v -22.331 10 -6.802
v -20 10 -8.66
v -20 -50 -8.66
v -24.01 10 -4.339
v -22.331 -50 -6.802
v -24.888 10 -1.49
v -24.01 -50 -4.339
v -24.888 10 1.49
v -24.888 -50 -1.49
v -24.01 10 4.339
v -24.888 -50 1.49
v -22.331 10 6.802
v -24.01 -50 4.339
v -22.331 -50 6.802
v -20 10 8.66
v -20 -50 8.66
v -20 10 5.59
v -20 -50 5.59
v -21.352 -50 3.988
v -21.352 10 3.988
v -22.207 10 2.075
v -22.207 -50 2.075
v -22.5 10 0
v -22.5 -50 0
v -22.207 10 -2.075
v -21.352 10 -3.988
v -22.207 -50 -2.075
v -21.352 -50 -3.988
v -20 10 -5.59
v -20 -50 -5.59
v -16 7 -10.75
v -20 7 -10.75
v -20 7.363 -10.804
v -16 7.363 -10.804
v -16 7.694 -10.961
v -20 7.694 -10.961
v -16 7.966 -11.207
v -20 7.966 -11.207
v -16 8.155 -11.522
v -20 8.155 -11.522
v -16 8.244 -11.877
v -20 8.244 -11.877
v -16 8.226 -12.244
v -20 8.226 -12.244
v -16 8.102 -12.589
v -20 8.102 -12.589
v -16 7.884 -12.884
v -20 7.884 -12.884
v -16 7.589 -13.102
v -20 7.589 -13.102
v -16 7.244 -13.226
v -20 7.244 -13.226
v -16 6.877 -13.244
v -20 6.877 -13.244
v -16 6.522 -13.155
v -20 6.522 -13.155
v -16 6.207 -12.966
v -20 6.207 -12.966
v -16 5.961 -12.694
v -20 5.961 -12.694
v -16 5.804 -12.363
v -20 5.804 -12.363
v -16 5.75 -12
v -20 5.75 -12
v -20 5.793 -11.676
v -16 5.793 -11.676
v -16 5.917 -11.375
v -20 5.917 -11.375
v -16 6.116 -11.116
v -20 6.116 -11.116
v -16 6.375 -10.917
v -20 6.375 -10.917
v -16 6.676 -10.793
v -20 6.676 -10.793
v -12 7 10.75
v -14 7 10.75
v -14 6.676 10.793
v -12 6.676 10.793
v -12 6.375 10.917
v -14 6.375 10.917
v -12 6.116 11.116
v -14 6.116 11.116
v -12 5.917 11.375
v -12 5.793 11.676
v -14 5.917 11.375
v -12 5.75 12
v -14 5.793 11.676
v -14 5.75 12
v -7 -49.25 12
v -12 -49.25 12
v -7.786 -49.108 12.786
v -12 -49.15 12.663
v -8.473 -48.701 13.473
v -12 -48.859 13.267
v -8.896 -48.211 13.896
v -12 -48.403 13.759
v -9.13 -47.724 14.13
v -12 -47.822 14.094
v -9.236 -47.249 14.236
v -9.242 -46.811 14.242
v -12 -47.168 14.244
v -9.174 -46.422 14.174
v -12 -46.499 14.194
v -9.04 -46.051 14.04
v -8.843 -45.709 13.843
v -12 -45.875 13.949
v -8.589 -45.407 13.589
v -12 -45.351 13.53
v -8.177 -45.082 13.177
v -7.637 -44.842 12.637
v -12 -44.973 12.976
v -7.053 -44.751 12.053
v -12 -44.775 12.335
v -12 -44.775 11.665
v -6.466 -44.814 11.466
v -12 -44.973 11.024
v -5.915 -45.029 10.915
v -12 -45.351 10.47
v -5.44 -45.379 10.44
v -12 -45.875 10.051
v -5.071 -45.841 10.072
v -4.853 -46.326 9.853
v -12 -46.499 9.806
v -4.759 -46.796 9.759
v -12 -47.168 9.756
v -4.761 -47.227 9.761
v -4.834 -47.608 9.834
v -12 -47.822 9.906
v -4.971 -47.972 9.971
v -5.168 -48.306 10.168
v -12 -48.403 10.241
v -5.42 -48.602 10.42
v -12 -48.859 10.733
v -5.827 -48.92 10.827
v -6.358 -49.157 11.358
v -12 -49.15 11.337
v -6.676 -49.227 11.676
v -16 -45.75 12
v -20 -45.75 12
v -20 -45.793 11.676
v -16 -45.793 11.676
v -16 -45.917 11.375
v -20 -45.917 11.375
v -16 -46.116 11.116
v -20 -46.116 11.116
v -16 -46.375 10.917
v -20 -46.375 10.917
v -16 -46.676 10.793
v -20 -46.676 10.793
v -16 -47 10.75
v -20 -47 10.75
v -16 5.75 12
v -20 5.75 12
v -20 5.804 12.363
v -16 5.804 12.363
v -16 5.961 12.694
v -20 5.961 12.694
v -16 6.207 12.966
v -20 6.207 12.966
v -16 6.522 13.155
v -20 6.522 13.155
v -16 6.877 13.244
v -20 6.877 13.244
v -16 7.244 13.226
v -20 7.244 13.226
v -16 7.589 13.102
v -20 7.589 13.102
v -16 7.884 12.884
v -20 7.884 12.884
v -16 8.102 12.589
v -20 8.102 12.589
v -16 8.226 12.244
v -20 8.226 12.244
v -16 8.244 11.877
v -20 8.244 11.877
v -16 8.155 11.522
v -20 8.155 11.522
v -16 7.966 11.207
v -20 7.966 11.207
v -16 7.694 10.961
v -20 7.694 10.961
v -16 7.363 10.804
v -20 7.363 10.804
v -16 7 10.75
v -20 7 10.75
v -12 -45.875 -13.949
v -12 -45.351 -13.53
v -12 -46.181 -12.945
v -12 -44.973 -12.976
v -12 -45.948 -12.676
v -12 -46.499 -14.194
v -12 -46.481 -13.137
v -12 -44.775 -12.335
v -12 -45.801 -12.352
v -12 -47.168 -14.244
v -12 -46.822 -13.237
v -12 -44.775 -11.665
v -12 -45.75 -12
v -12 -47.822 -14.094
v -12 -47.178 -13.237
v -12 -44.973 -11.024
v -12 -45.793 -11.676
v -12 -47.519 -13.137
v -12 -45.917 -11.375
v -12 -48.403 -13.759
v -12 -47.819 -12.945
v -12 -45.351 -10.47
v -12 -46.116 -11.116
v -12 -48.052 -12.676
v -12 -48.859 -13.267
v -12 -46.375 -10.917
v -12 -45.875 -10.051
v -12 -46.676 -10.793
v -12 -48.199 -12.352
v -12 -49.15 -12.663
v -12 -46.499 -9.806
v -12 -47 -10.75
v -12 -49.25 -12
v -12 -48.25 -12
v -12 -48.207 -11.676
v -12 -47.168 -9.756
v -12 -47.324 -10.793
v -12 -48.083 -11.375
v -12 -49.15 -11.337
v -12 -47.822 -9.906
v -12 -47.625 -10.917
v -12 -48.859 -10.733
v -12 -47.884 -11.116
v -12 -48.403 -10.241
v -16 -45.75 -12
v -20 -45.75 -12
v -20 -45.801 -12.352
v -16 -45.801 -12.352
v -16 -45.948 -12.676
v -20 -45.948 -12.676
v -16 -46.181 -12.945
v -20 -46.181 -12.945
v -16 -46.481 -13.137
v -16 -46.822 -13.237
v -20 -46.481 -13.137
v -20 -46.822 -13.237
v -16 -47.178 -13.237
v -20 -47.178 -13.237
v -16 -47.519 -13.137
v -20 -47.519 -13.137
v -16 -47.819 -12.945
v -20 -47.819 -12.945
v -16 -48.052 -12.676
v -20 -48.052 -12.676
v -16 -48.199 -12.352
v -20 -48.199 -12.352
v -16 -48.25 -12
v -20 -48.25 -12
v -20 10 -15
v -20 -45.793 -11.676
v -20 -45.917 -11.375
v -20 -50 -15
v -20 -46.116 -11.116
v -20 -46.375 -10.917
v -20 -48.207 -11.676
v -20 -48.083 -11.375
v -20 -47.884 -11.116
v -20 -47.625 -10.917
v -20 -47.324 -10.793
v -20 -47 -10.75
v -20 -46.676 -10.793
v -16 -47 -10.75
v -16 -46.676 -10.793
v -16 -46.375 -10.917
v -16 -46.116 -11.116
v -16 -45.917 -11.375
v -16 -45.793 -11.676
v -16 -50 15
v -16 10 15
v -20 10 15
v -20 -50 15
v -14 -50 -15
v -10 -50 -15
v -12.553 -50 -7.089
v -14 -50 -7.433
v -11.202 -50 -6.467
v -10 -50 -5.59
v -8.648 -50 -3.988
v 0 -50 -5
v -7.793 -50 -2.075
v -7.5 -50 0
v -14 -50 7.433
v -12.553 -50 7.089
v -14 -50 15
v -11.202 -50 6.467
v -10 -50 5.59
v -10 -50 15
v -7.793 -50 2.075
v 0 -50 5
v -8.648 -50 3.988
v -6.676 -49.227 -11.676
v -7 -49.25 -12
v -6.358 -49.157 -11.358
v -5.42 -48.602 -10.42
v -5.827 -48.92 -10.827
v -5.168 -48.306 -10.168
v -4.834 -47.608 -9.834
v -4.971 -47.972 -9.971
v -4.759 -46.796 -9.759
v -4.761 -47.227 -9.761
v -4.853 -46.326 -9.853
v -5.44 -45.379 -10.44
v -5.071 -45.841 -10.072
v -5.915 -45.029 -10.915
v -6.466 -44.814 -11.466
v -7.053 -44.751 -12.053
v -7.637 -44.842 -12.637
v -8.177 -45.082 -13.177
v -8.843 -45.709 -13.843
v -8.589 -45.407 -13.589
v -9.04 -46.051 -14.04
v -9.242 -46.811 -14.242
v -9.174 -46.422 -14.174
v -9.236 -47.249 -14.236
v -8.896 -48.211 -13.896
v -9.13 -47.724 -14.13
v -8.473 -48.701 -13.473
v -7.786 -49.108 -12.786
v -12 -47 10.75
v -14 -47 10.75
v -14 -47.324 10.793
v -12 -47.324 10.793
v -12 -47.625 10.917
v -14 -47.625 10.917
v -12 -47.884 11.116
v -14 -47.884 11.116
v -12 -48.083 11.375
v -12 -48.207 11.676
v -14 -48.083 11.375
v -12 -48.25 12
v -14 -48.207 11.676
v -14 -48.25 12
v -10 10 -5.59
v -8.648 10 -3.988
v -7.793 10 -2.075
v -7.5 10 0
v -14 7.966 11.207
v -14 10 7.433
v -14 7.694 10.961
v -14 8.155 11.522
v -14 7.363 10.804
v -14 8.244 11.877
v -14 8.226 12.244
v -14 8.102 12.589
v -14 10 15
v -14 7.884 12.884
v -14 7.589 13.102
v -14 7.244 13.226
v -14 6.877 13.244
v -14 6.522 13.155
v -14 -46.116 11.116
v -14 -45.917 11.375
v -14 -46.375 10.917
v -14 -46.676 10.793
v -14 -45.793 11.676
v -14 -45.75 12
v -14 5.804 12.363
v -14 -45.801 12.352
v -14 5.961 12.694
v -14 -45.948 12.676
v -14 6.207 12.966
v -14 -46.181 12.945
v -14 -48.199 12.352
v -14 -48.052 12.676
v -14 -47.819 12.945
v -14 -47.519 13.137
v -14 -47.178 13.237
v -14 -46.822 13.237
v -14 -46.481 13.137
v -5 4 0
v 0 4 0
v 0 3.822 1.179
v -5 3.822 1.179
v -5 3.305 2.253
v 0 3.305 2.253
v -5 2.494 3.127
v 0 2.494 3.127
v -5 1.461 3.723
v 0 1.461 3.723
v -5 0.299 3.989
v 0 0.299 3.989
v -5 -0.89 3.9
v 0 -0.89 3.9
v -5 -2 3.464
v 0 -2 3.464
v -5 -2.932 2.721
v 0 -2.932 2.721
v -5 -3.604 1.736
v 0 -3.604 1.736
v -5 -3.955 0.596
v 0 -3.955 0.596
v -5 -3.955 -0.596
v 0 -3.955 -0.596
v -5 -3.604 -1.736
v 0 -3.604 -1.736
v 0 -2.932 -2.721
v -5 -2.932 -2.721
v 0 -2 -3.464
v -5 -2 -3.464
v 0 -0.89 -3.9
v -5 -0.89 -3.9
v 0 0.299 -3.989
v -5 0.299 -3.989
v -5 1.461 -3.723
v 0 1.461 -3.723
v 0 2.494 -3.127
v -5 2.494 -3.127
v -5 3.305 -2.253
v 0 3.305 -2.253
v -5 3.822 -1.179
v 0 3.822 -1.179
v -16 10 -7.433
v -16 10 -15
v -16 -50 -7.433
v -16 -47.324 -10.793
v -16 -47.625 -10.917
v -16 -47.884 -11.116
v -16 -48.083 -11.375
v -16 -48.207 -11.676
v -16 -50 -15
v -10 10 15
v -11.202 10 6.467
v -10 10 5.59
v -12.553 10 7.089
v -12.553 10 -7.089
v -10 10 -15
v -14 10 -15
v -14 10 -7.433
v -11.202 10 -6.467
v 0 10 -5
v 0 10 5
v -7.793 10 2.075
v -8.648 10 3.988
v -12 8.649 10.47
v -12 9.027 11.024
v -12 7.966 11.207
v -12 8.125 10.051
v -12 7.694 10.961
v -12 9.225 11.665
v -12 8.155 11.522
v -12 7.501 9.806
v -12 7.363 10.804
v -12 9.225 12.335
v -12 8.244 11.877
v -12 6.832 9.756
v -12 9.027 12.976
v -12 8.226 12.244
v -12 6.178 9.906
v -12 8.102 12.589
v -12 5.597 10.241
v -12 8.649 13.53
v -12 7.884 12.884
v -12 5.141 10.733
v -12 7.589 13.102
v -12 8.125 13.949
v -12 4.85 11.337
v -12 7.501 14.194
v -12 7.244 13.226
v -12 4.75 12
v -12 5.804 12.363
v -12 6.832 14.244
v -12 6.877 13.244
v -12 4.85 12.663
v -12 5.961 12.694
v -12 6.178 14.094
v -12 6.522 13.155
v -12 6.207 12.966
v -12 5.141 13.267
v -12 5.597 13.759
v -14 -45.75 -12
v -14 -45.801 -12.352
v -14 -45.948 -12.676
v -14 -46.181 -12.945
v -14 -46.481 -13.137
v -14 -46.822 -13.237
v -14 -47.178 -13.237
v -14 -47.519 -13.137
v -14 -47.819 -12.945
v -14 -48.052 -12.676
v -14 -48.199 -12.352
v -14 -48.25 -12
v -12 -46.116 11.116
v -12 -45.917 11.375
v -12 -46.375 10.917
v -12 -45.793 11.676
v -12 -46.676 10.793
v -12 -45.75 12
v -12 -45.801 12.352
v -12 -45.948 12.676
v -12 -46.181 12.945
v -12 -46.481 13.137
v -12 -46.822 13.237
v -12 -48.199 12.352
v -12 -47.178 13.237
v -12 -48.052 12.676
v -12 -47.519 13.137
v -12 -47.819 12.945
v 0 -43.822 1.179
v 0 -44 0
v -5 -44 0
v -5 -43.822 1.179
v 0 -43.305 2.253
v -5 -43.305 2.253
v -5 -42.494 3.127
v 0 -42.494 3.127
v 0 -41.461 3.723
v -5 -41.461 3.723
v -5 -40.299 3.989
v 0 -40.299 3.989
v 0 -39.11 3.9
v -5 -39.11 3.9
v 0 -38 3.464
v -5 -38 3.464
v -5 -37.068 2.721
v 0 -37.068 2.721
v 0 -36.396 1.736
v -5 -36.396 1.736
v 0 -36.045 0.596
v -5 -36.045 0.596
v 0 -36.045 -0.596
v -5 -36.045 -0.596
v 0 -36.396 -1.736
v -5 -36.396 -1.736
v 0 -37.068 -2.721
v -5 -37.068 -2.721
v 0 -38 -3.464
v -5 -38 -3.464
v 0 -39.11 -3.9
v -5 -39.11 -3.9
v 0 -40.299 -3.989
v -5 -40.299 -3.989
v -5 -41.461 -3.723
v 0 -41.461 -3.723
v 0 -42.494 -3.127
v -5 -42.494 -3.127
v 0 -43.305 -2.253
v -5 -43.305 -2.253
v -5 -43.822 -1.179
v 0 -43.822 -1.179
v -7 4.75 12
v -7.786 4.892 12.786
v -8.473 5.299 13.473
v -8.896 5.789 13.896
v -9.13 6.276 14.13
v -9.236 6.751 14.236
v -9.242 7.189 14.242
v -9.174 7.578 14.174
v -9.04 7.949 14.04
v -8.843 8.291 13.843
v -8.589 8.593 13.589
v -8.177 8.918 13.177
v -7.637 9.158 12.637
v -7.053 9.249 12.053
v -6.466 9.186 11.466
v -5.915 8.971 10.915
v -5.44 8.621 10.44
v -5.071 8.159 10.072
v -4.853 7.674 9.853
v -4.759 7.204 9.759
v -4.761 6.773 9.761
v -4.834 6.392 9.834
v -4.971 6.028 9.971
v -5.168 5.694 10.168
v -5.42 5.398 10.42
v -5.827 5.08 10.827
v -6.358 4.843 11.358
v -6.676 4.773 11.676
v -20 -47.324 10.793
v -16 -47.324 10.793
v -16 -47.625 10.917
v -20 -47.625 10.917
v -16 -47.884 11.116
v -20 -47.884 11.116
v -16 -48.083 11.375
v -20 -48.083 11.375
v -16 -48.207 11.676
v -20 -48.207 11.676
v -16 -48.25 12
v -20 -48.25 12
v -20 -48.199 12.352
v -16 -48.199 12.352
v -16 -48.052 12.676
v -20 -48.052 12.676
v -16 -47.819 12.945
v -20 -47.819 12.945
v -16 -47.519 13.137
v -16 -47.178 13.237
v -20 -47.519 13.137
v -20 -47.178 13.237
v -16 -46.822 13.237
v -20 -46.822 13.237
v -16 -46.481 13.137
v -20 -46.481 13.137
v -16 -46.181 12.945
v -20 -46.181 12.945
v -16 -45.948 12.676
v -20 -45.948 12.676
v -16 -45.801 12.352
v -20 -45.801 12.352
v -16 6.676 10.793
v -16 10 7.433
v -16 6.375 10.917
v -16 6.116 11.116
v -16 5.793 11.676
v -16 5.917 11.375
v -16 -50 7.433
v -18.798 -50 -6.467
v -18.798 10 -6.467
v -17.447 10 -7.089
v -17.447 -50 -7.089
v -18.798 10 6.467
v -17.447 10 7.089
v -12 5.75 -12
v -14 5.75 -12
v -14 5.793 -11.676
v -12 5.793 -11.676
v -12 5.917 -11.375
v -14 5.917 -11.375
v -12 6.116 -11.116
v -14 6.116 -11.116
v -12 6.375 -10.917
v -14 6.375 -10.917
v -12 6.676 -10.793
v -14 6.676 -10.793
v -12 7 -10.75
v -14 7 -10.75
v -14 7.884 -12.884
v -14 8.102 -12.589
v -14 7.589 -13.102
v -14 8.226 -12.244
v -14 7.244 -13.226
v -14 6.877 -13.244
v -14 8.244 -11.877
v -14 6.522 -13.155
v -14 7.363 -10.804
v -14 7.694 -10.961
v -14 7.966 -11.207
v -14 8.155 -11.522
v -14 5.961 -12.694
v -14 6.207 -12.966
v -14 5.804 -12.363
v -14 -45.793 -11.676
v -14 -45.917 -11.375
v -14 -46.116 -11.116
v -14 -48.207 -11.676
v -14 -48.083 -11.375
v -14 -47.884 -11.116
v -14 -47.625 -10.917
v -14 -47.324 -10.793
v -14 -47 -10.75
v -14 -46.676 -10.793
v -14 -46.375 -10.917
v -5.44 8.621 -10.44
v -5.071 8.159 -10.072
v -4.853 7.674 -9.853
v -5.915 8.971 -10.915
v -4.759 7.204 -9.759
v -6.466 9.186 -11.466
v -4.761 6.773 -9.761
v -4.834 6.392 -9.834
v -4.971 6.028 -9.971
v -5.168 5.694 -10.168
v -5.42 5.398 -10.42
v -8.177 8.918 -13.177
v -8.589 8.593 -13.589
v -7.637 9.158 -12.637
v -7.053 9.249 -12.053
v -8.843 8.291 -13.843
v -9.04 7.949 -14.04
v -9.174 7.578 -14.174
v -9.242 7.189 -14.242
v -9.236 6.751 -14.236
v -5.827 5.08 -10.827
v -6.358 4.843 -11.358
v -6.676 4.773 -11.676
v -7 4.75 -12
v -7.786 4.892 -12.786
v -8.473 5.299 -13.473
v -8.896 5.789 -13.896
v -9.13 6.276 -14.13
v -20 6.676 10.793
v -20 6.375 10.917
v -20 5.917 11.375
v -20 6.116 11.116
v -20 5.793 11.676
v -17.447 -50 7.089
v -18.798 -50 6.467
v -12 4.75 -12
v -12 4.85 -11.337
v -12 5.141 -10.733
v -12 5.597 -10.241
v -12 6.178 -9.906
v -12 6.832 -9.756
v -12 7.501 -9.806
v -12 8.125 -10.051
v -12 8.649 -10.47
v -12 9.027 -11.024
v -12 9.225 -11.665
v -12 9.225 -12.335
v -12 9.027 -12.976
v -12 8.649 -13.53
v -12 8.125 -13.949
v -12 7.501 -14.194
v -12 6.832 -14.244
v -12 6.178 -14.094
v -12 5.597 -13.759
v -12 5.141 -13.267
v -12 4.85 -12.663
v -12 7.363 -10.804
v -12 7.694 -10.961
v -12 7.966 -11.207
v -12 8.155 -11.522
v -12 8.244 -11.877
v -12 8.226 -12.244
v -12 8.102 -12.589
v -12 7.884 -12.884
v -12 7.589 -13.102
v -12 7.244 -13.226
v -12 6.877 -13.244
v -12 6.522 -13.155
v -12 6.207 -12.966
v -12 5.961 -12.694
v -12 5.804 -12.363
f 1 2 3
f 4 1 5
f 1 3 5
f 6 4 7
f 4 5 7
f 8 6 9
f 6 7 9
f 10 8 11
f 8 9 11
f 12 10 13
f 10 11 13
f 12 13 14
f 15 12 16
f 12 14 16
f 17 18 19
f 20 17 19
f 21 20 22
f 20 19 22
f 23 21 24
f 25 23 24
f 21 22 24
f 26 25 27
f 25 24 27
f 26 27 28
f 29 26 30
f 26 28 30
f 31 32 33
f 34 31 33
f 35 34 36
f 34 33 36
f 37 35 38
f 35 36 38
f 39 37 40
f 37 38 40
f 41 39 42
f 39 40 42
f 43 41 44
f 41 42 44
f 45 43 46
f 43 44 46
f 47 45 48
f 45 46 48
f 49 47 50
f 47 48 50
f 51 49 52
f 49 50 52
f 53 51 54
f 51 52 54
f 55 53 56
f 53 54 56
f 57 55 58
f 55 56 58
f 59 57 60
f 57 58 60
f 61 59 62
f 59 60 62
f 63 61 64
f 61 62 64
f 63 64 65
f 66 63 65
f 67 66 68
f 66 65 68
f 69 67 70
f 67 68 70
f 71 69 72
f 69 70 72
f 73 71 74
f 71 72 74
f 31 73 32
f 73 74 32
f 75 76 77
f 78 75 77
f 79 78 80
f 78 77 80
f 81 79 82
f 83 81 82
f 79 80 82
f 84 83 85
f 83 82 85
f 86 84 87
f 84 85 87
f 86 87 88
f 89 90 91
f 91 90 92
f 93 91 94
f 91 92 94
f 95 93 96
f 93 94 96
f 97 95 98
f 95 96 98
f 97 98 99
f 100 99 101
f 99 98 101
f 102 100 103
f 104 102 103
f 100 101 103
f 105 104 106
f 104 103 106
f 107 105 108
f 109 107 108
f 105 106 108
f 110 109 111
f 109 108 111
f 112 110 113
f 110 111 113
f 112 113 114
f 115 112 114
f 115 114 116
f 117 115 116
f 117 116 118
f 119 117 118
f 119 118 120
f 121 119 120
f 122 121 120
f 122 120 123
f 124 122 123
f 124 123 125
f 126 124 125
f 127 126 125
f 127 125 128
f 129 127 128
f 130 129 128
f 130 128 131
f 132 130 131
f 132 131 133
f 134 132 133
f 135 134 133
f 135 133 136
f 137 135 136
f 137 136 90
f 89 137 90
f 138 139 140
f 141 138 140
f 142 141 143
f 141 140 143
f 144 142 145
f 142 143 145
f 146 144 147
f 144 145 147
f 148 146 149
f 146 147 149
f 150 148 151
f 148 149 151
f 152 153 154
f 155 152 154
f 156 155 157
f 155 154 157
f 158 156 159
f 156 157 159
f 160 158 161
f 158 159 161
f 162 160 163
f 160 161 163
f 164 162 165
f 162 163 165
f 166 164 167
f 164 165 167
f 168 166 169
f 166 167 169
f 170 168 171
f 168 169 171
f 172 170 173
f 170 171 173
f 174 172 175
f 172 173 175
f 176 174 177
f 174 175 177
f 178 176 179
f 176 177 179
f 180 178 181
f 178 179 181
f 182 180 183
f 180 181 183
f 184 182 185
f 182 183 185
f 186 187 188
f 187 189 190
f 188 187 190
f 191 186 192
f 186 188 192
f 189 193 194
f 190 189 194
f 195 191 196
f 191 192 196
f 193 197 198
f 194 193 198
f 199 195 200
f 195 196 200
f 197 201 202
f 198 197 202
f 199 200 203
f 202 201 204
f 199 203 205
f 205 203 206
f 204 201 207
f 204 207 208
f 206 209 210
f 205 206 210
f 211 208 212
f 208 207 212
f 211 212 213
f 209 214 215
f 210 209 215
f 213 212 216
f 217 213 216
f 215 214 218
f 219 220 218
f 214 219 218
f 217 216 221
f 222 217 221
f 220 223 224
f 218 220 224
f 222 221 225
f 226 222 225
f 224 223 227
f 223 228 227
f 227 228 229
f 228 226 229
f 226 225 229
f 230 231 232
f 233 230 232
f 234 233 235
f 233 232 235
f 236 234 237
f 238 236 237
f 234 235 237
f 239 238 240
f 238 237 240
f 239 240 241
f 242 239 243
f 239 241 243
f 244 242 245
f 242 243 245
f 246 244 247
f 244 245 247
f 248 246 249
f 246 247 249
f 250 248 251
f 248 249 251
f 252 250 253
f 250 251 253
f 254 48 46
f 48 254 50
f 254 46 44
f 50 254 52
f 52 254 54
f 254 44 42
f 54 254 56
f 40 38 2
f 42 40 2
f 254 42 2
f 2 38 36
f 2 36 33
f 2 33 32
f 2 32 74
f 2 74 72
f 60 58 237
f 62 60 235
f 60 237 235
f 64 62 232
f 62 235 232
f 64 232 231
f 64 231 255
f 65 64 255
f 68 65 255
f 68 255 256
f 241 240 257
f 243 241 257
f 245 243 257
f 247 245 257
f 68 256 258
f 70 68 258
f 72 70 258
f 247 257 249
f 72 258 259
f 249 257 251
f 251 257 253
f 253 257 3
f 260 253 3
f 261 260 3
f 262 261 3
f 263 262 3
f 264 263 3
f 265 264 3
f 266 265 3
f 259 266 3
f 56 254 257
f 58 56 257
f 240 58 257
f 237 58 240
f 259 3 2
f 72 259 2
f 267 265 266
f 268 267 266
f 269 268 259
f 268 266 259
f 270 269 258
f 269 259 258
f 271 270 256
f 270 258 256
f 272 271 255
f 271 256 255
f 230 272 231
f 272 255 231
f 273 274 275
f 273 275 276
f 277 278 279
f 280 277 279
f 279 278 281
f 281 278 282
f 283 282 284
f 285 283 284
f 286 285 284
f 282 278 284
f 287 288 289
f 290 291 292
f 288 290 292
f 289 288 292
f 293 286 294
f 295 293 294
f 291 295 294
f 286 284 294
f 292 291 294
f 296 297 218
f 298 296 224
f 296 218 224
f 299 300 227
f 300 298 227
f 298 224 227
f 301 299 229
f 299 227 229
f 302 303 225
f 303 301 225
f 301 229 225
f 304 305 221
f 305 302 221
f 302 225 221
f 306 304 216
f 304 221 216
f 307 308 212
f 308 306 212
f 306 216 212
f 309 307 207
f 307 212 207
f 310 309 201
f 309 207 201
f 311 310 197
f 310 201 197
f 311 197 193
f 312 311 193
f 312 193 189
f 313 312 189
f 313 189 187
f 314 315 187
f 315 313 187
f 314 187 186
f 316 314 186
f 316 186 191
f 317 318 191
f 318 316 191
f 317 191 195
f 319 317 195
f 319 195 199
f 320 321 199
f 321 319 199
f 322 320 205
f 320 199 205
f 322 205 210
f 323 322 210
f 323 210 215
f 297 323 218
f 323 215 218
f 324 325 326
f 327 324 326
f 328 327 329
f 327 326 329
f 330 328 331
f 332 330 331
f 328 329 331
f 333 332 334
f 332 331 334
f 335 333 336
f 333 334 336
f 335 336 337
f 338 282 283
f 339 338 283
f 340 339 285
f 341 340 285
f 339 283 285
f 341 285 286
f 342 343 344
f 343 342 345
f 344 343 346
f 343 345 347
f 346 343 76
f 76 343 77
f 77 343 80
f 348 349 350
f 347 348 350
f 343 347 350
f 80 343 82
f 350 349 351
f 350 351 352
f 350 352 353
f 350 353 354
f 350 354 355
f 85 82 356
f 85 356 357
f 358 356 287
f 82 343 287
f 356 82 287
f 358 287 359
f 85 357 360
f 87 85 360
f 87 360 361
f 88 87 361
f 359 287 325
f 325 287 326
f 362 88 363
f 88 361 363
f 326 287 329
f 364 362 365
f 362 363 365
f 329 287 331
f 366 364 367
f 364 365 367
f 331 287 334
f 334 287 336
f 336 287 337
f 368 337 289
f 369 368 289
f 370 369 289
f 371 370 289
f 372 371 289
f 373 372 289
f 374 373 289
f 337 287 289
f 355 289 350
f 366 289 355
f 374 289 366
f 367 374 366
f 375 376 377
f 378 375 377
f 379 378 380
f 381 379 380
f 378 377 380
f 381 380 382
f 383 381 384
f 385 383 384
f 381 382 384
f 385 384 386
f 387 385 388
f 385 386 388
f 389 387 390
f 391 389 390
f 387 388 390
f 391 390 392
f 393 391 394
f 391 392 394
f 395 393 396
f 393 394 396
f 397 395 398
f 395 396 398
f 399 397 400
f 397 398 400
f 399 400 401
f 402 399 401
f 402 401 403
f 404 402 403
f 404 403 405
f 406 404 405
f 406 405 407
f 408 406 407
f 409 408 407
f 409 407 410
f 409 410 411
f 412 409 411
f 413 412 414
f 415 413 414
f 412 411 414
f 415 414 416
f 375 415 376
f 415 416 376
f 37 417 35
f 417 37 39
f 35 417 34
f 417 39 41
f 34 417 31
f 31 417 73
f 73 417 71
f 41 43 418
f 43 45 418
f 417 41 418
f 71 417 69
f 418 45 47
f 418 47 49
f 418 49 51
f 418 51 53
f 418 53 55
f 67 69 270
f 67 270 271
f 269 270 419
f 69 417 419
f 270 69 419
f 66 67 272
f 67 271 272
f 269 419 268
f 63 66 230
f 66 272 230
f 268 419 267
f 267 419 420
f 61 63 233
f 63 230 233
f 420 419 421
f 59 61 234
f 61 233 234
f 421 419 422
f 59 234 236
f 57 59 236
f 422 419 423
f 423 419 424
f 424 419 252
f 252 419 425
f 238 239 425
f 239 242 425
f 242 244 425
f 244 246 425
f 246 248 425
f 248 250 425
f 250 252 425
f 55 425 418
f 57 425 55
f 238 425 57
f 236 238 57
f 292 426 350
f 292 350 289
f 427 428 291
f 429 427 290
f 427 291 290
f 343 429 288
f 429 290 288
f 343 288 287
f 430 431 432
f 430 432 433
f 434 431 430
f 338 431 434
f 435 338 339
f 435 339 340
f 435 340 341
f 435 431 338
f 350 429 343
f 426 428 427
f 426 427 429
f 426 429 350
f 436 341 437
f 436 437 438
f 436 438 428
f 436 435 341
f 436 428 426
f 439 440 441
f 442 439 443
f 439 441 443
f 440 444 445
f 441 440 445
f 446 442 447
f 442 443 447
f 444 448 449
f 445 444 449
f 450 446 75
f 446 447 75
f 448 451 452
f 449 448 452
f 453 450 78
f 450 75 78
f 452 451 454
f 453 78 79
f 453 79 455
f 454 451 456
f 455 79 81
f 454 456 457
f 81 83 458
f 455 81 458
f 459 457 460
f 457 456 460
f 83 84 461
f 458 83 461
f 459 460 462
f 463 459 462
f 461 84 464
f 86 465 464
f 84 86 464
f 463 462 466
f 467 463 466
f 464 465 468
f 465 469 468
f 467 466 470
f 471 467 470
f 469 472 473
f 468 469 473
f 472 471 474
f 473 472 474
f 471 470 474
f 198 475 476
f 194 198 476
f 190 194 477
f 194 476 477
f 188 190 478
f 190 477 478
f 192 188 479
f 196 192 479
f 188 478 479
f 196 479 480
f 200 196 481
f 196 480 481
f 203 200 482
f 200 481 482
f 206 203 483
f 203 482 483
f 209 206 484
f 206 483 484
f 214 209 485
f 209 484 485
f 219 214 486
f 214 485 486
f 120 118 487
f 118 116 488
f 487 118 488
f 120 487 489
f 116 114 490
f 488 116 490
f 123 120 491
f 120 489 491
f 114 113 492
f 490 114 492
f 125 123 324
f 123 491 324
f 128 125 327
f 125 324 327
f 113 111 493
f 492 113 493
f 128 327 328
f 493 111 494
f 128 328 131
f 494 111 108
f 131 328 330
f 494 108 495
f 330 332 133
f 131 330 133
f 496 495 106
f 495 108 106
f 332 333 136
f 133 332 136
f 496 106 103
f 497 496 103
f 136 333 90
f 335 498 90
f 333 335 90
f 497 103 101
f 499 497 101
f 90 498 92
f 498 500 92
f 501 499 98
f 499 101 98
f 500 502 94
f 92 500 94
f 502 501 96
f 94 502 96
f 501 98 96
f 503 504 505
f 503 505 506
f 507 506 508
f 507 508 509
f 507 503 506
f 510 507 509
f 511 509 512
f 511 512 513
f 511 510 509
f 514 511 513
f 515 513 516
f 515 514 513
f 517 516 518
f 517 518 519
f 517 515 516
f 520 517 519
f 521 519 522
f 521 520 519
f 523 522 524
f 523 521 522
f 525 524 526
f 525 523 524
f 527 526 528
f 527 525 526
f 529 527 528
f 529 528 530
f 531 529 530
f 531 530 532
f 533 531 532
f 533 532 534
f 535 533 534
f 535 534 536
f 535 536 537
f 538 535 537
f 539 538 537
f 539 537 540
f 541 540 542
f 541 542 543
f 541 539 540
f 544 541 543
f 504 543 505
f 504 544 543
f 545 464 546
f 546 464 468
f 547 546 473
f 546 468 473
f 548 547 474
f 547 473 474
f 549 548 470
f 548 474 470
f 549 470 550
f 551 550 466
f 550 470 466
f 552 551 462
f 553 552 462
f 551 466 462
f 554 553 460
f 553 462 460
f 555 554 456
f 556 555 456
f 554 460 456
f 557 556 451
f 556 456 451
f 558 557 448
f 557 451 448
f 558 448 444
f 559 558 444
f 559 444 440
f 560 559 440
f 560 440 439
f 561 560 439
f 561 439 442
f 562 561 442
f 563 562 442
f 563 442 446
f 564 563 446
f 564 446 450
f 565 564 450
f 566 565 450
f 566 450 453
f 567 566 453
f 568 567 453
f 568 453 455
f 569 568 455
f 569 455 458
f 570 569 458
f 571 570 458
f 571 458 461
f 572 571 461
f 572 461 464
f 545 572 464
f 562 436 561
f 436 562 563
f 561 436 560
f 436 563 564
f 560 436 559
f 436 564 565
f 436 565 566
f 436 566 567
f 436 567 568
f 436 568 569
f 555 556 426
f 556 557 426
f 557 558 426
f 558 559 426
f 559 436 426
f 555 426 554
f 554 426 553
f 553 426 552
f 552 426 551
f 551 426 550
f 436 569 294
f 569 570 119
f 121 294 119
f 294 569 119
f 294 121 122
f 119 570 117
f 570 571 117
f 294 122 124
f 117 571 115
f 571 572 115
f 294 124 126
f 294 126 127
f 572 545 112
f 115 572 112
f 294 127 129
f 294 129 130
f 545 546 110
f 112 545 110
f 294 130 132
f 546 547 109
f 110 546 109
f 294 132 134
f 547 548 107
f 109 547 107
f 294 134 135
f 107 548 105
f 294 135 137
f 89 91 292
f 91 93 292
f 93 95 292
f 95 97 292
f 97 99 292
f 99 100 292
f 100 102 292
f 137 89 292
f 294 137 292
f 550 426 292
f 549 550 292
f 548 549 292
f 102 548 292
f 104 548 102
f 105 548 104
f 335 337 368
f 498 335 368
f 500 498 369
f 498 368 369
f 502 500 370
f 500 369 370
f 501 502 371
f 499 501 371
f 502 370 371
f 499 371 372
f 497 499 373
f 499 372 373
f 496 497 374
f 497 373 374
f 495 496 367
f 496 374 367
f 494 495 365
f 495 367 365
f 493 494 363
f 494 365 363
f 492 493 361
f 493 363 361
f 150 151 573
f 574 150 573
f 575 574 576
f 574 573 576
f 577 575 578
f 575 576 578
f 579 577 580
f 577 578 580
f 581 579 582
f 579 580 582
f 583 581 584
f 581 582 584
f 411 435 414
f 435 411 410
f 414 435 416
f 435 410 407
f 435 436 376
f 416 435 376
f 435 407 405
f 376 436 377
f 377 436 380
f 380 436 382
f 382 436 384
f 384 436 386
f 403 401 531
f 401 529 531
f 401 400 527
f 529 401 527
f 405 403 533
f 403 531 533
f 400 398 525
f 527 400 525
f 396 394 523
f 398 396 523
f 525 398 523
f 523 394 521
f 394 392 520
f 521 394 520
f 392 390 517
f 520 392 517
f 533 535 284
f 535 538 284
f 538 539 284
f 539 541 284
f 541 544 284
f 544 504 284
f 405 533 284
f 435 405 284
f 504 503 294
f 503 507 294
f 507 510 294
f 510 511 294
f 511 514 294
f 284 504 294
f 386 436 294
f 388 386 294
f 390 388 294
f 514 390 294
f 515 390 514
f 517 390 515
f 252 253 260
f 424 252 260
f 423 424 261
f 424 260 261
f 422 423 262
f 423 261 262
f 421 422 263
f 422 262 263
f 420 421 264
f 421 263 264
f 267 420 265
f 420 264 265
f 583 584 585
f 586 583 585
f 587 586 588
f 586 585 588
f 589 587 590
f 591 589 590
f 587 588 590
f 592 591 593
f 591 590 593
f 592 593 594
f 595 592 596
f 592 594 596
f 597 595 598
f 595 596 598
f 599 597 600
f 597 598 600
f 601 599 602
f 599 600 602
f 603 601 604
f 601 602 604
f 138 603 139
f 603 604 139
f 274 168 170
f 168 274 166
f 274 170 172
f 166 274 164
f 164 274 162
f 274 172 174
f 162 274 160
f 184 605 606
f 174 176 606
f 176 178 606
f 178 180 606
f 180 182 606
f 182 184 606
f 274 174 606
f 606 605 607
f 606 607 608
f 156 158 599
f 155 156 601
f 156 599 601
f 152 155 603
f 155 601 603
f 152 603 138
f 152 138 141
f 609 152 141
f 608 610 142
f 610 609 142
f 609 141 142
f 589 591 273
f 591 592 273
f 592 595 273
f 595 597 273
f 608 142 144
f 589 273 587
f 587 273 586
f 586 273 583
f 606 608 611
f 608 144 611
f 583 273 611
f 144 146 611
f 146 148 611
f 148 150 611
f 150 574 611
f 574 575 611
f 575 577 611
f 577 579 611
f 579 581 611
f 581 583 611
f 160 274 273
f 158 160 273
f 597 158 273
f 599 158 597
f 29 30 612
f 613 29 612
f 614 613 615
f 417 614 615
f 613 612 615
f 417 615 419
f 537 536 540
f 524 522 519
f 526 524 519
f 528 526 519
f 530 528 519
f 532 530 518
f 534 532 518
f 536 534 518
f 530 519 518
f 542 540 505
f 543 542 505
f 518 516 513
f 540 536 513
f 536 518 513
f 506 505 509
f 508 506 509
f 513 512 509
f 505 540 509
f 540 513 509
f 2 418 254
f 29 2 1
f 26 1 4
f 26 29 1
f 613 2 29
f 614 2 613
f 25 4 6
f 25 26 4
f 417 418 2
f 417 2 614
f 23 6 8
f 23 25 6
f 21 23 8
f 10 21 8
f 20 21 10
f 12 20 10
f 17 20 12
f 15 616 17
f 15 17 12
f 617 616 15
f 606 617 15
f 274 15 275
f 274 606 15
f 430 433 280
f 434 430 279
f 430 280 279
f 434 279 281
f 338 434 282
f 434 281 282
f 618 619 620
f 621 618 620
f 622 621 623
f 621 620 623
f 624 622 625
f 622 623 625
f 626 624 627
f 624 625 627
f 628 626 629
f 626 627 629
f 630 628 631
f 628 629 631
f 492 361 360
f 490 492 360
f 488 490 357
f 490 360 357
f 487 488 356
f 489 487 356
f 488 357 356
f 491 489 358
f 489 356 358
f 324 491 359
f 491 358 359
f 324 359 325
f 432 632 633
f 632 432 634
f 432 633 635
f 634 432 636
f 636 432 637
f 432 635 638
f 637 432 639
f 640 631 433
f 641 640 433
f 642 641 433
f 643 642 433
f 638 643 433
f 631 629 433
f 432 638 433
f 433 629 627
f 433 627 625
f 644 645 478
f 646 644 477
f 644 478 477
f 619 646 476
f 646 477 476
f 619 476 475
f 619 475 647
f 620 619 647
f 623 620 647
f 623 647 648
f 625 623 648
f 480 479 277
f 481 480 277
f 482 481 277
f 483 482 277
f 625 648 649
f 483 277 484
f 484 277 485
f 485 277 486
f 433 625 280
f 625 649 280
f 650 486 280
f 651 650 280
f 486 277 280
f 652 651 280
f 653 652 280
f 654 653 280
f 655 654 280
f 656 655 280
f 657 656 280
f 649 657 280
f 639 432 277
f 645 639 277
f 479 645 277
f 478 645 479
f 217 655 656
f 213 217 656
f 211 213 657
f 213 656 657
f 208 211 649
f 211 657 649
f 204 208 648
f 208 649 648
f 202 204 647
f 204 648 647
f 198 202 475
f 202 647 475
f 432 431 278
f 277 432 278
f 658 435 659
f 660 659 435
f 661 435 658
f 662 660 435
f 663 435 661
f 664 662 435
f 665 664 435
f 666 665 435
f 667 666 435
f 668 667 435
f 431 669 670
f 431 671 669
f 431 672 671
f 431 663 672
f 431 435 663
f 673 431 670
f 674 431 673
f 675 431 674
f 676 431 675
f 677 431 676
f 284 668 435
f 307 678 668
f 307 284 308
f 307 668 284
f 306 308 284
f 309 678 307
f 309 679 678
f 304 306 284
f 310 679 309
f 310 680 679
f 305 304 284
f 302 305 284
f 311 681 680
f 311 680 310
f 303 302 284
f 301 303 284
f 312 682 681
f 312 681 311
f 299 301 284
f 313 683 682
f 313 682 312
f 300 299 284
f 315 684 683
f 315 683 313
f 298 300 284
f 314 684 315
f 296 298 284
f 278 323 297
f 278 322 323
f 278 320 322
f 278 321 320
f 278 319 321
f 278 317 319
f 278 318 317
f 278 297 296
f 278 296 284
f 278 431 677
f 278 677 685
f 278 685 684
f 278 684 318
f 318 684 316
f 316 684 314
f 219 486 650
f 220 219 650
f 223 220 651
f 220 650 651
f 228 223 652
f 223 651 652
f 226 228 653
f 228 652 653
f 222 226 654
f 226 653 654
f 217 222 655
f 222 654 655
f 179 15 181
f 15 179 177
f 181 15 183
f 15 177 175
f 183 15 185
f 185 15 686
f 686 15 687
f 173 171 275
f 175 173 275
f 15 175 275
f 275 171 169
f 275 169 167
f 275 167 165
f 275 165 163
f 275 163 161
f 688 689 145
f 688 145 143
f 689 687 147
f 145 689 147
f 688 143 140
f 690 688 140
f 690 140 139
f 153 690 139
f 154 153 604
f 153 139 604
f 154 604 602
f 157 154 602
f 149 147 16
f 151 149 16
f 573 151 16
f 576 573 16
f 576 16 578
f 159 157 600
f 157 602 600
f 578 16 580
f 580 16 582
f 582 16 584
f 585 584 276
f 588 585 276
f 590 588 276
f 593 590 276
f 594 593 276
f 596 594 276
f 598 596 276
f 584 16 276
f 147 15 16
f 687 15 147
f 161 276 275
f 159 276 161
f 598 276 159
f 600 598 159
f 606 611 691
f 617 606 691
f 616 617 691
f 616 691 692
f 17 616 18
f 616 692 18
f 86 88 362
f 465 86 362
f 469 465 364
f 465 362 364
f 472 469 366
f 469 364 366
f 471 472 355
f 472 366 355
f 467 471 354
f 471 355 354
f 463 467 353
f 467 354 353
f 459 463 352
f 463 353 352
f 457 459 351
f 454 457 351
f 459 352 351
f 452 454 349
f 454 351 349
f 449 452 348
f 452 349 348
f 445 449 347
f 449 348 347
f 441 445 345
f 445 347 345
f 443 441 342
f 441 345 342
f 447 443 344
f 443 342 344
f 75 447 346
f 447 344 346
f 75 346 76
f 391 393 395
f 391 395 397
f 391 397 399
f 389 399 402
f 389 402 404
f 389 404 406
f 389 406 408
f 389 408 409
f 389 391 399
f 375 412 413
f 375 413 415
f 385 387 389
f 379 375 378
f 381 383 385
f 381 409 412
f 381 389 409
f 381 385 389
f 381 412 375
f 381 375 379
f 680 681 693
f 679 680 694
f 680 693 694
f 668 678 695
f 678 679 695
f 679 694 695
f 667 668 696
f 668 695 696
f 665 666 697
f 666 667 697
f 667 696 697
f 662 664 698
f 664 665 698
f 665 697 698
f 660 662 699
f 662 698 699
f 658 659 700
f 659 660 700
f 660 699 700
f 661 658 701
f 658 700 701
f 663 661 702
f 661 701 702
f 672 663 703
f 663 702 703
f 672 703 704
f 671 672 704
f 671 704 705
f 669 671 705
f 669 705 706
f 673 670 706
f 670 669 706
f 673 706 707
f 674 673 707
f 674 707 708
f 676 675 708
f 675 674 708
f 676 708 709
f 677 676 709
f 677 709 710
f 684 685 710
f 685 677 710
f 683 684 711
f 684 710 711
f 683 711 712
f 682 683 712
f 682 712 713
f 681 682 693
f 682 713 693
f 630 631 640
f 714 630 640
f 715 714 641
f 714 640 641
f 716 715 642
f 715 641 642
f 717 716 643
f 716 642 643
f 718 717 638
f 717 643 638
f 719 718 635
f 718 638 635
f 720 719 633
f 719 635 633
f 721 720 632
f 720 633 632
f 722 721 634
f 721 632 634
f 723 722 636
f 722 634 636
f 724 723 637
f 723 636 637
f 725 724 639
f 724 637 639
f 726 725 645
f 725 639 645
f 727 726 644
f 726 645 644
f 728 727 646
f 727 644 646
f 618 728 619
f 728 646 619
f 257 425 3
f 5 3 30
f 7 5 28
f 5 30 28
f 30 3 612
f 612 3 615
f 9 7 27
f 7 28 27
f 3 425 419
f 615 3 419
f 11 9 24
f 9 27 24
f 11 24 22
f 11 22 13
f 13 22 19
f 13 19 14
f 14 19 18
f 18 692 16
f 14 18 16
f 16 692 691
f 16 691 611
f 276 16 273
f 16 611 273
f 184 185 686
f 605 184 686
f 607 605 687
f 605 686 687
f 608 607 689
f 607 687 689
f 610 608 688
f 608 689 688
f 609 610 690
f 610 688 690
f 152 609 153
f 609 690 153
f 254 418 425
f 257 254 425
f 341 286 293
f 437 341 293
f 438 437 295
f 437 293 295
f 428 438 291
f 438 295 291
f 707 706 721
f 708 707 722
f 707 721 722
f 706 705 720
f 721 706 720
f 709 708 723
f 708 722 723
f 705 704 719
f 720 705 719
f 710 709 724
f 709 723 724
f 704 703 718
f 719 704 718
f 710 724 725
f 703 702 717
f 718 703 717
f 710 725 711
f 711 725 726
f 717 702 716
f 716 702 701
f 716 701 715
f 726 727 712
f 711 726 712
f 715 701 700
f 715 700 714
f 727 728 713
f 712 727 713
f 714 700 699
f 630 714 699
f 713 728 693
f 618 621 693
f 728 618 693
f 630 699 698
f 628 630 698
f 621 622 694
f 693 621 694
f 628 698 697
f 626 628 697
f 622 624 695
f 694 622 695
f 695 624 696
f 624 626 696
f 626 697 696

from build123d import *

# Parameters (mm, degrees)
F0_R        = 4
F1_DEPTH    = 200
F3_R        = 4
F4_DEPTH    = 5
F3_R_2      = 5
F4_FACE_R   = 5
F4_FACE_R_2 = 4
F1_FACE_R   = 4
F2_FACE_R   = 4
F3_W        = 60.0000001103
F3_H        = 30
F5_DEPTH    = 30
F7_DEPTH    = 60.0010001103
F8_DEPTH    = 60.0010001103
F9_SIZE     = 9.99999
F11_DEPTH   = 25
F13_START   = -2
F12_R       = 2.25
F12_R_2     = 1.25
F13_DEPTH   = 23
F14_DEPTH   = 200
F15_DEPTH   = 5


# Not quite as in the source:
# - a fillet or chamfer is up to 0.001 mm smaller than in the source, because OpenCascade refuses the exact size
# - a pattern or mirror of a feature is missing from the dataset's text; its kind, count and spacing are read off the source's solid
# - a feature names something its author has since deleted; it is built from what else it names


with BuildPart() as f1:
    # F0 (on Right) → F1 (new body)
    with BuildSketch(Plane.YZ):
        Circle(F0_R)
    extrude(amount=F1_DEPTH)


with BuildPart() as f2_1:
    # F2: copy of F1
    add(f1.part.moved(Location((0, -40, 0))))


with BuildPart() as f4:
    # F3 (on face) → F4 (new body)
    with BuildSketch(Plane(origin=(0, 0, 0), x_dir=(0, -1, 0), z_dir=(-1, 0, 0))):
        with Locations((40, 0)):
            Circle(F3_R)
    extrude(amount=-F4_DEPTH)


with BuildPart() as f4b:
    # F3 (on face) → F4, piece 2 (new body)
    with BuildSketch(Plane(origin=(0, 0, 0), x_dir=(0, -1, 0), z_dir=(-1, 0, 0))):
        Circle(F3_R_2)
        Circle(F3_R, mode=Mode.SUBTRACT)
    extrude(amount=-F4_DEPTH)


with BuildPart() as f1_1:
    add(f1.part)

    add(f2_1.part)  # F5 merges F2_1

    add(f4.part)  # F5 merges F4

    add(f4b.part)  # F5 merges F4b
    # F4_face (on face) + F1_face (on face) + F2_face (on face) + F3 (on face) → F5 (join)
    with BuildSketch(Plane(origin=(0, 0, 0), x_dir=(0, -1, 0), z_dir=(-1, 0, 0))):
        Circle(F4_FACE_R)
        Circle(F4_FACE_R_2, mode=Mode.SUBTRACT)
        with Locations((40, 0)):
            Circle(F4_FACE_R_2)
    with BuildSketch(Plane(origin=(0, 0, 0), x_dir=(0, 1, 0), z_dir=(-1, 0, 0))):
        Circle(F1_FACE_R)
    with BuildSketch(Plane(origin=(0, -40, 0), x_dir=(0, -1, 0), z_dir=(-1, 0, 0))):
        Circle(F2_FACE_R)
    with BuildSketch(Plane(origin=(0, 0, 0), x_dir=(0, -1, 0), z_dir=(-1, 0, 0))):
        with Locations((19.9999999448, 0)):
            Rectangle(F3_W, F3_H)
        Circle(F3_R_2, mode=Mode.SUBTRACT)
        with Locations((40, 0)):
            Circle(F3_R_2, mode=Mode.SUBTRACT)
        with Locations((40, 0)):
            Circle(F3_R_2)
        with Locations((40, 0)):
            Circle(F3_R, mode=Mode.SUBTRACT)
    extrude(amount=F5_DEPTH)

    # F6 (on face) → F7 (cut, through all)
    with BuildSketch(Plane.XZ.offset(50)):
        with BuildLine():
            Line((-10, -5.5901699437), (-10, 5.5901699437))
            ThreePointArc((-10, 5.5901699437), (-11.8616824051, 6.8118252087), (-14, 7.4330343737))
            Line((-14, 7.4330343737), (-14, -7.4330343737))
            ThreePointArc((-14, -7.4330343737), (-11.8616824051, -6.8118252087), (-10, -5.5901699437))
        make_face()
        with BuildLine():
            Line((-14, -7.4330343737), (-14, 7.4330343737))
            ThreePointArc((-14, 7.4330343737), (-15, 7.5), (-16, 7.4330343737))
            Line((-16, 7.4330343737), (-16, -7.4330343737))
            ThreePointArc((-16, -7.4330343737), (-15, -7.5), (-14, -7.4330343737))
        make_face()
        with BuildLine():
            Line((-16, -7.4330343737), (-16, 7.4330343737))
            ThreePointArc((-16, 7.4330343737), (-18.1383175949, 6.8118252087), (-20, 5.5901699437))
            Line((-20, 5.5901699437), (-20, -5.5901699437))
            ThreePointArc((-20, -5.5901699437), (-18.1383175949, -6.8118252087), (-16, -7.4330343737))
        make_face()
        with BuildLine():
            ThreePointArc((-10, -5.5901699437), (-8.1534680312, -3.0618621785), (-7.5, 0))
            ThreePointArc((-7.5, 0), (-8.1534680312, 3.0618621785), (-10, 5.5901699437))
            Line((-10, 5.5901699437), (-10, -5.5901699437))
        make_face()
        with BuildLine():
            Line((-20, -5.5901699437), (-20, 5.5901699437))
            ThreePointArc((-20, 5.5901699437), (-22.5, 0), (-20, -5.5901699437))
        make_face()
        with BuildLine():
            ThreePointArc((-16, 9.9498743711), (-15, 10), (-14, 9.9498743711))
            Line((-14, 9.9498743711), (-14, 15))
            Line((-14, 15), (-16, 15))
            Line((-16, 15), (-16, 9.9498743711))
        make_face()
        with BuildLine():
            ThreePointArc((-16, 7.4330343737), (-15, 7.5), (-14, 7.4330343737))
            Line((-14, 7.4330343737), (-14, 9.9498743711))
            ThreePointArc((-14, 9.9498743711), (-15, 10), (-16, 9.9498743711))
            Line((-16, 9.9498743711), (-16, 7.4330343737))
        make_face()
        with BuildLine():
            Line((-14, -9.9498743711), (-14, -7.4330343737))
            ThreePointArc((-14, -7.4330343737), (-15, -7.5), (-16, -7.4330343737))
            Line((-16, -7.4330343737), (-16, -9.9498743711))
            ThreePointArc((-16, -9.9498743711), (-15, -10), (-14, -9.9498743711))
        make_face()
        with BuildLine():
            Line((-14, -15), (-14, -9.9498743711))
            ThreePointArc((-14, -9.9498743711), (-15, -10), (-16, -9.9498743711))
            Line((-16, -9.9498743711), (-16, -15))
            Line((-16, -15), (-14, -15))
        make_face()
    extrude(amount=-F7_DEPTH, mode=Mode.SUBTRACT)

    # F6 (on face) → F8 (cut, through all)
    with BuildSketch(Plane.XZ.offset(50)):
        with BuildLine():
            ThreePointArc((-20, -8.6602540378), (-25, 0), (-20, 8.6602540378))
            Line((-20, 8.6602540378), (-20, 15))
            Line((-20, 15), (-30, 15))
            Line((-30, 15), (-30, -15))
            Line((-30, -15), (-20, -15))
            Line((-20, -15), (-20, -8.6602540378))
        make_face()
    extrude(amount=-F8_DEPTH, mode=Mode.SUBTRACT)

    # F9 (size 10 in the source; OpenCascade refuses exactly that, so slightly less here)
    f9_edges = [f1_1.edges().sort_by_distance(p)[0] for p in [
        (0, -20, 15),
        (0, -20, -15),
    ]]
    chamfer(f9_edges, length=F9_SIZE)

    # F10 (on face) → F11 (cut)
    with BuildSketch(Plane(origin=(-20, 0, 0), x_dir=(0, -1, 0), z_dir=(-1, 0, 0))):
        with BuildLine():
            Line((-7.0000001103, 12), (-7.0000001103, 10.75))
            ThreePointArc((-7.0000001103, 10.75), (-6.1161166338, 11.1161165235), (-5.7500001103, 12))
            Line((-5.7500001103, 12), (-7.0000001103, 12))
        make_face()
        with BuildLine():
            ThreePointArc((-5.7500001103, 12), (-7.8838835868, 12.8838834765), (-7.0000001103, 10.75))
            Line((-7.0000001103, 10.75), (-7.0000001103, 12))
            Line((-7.0000001103, 12), (-5.7500001103, 12))
        make_face()
        with BuildLine():
            ThreePointArc((45.75, 12), (46.1161165235, 11.1161165235), (47, 10.75))
            Line((47, 10.75), (47, 12))
            Line((47, 12), (45.75, 12))
        make_face()
        with BuildLine():
            Line((47, 12), (47, 10.75))
            ThreePointArc((47, 10.75), (47.8838834765, 11.1161165235), (48.25, 12))
            ThreePointArc((48.25, 12), (47, 13.25), (45.75, 12))
            Line((45.75, 12), (47, 12))
        make_face()
        with BuildLine():
            ThreePointArc((47, -10.75), (46.1161165235, -11.1161165235), (45.75, -12))
            Line((45.75, -12), (47, -12))
            Line((47, -12), (47, -10.75))
        make_face()
        with BuildLine():
            Line((47, -12), (45.75, -12))
            ThreePointArc((45.75, -12), (47, -13.25), (48.25, -12))
            ThreePointArc((48.25, -12), (47.8838834765, -11.1161165235), (47, -10.75))
            Line((47, -10.75), (47, -12))
        make_face()
        with BuildLine():
            ThreePointArc((-5.7500001103, -12), (-6.1161166338, -11.1161165235), (-7.0000001103, -10.75))
            Line((-7.0000001103, -10.75), (-7.0000001103, -12))
            Line((-7.0000001103, -12), (-5.7500001103, -12))
        make_face()
        with BuildLine():
            Line((-7.0000001103, -12), (-7.0000001103, -10.75))
            ThreePointArc((-7.0000001103, -10.75), (-7.8838835868, -12.8838834765), (-5.7500001103, -12))
            Line((-5.7500001103, -12), (-7.0000001103, -12))
        make_face()
    extrude(amount=-F11_DEPTH, mode=Mode.SUBTRACT)

    # F12 (on face) → F13 (cut)
    with BuildSketch(Plane(origin=(-14, 0, 0), x_dir=(0, -1, 0), z_dir=(-1, 0, 0)).offset(F13_START)):
        with Locations((47, 12)):
            Circle(F12_R)
        with Locations((47, 12)):
            Circle(F12_R_2, mode=Mode.SUBTRACT)
        with Locations((47, -12)):
            Circle(F12_R)
        with Locations((-7.0000001103, -12)):
            Circle(F12_R)
        with Locations((-7.0000001103, 12)):
            Circle(F12_R)
        with Locations((-7.0000001103, 12)):
            Circle(F12_R_2, mode=Mode.SUBTRACT)
    extrude(amount=-F13_DEPTH, mode=Mode.SUBTRACT)

    # F14 (cut, through all): faces of the model
    f14_faces = [f1_1.faces().sort_by_distance(p)[0] for p in [
        (200, -40, 0),
        (200, 0, 0),
    ]]
    extrude(f14_faces, amount=-F14_DEPTH, mode=Mode.SUBTRACT)

    # F15 (cut): faces of the model
    f15_faces = [f1_1.faces().sort_by_distance(p)[0] for p in [
        (0, 0, 0),
        (0, 0, 0),
        (5, 4.8585786438, 0),
    ]]
    f15 = extrude(f15_faces, amount=-F15_DEPTH, mode=Mode.SUBTRACT)

    # F15_copies: F15 across plane
    add(f15.mirror(Plane(origin=(0, -20, 0), x_dir=(0, 0, -1), z_dir=(0, -1, 0))), mode=Mode.SUBTRACT)


solid = f1_1.part
